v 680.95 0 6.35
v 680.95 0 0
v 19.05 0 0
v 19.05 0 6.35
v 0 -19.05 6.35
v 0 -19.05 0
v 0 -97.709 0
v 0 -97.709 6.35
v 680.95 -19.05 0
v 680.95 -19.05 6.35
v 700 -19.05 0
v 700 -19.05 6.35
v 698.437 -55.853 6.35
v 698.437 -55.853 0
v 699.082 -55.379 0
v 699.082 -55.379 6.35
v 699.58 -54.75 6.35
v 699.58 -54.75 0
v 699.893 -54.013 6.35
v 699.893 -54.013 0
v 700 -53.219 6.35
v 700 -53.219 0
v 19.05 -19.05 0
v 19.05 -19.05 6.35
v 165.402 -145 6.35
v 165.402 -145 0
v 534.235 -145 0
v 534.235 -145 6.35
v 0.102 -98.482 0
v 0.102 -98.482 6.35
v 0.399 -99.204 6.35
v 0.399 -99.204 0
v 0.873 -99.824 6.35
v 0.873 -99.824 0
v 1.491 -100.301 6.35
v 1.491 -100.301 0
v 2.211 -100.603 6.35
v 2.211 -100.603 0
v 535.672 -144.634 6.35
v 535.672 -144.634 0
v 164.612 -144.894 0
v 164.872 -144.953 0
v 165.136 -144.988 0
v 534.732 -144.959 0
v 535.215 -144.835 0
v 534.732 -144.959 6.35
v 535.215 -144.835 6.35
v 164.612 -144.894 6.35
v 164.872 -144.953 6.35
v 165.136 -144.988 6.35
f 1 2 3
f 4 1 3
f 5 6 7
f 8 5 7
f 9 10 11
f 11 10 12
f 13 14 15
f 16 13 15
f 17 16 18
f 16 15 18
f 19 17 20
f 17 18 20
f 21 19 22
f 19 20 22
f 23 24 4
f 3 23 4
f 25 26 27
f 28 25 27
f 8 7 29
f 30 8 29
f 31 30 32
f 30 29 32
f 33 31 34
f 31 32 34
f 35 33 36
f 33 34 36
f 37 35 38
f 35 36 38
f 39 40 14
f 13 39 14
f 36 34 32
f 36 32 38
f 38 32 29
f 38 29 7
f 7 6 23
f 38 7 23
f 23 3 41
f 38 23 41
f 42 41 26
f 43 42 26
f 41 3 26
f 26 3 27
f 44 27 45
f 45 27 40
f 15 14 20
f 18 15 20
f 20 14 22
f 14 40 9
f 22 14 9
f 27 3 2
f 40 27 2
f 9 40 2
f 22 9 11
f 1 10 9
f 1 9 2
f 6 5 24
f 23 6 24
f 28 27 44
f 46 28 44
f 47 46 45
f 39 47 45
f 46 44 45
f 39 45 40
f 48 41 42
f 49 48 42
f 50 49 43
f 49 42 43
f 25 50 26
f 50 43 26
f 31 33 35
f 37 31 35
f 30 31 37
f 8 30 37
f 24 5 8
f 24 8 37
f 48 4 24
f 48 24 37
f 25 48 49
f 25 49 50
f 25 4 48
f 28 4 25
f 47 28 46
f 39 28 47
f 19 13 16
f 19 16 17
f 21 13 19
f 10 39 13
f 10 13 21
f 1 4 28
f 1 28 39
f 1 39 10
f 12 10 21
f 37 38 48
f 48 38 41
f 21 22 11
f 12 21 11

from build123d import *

# Parameters (mm, degrees)
BOSS_EXTRUDE1_DEPTH = 6.35
SKETCH2_W           = 19.05
SKETCH2_H           = 19.05
CUT_EXTRUDE1_DEPTH  = 715.888328692


with BuildPart() as part:
    # Sketch1 → Boss-Extrude1 (new body)
    with BuildSketch(Plane.XY):
        with BuildLine():
            Line((700, -53.219100704), (700, 0))
            Line((700, 0), (0, 0))
            Line((0, 0), (0, -97.708612477))
            ThreePointArc((0, -97.708612477), (0.615879968, -99.529593442), (2.210647783, -100.602903941))
            Line((2.210647783, -100.602903941), (164.612402034, -144.894291464))
            ThreePointArc((164.612402034, -144.894291464), (165.003554798, -144.97345543), (165.401754251, -145))
            Line((165.401754251, -145), (534.235017957, -145))
            ThreePointArc((534.235017957, -145), (534.976280341, -144.906979546), (535.671574349, -144.633686719))
            Line((535.671574349, -144.633686719), (698.436556392, -55.852787423))
            ThreePointArc((698.436556392, -55.852787423), (699.579696608, -54.750493995), (700, -53.219100704))
        make_face()
    extrude(amount=BOSS_EXTRUDE1_DEPTH)

    # Sketch2 → Cut-Extrude1 (cut, through all)
    with BuildSketch(Plane.XY.offset(6.35)):
        with Locations((9.525, -9.525)):
            Rectangle(SKETCH2_W, SKETCH2_H)
        with Locations((690.475, -9.525)):
            Rectangle(SKETCH2_W, SKETCH2_H)
    extrude(amount=-CUT_EXTRUDE1_DEPTH, mode=Mode.SUBTRACT)


solid = part.part
